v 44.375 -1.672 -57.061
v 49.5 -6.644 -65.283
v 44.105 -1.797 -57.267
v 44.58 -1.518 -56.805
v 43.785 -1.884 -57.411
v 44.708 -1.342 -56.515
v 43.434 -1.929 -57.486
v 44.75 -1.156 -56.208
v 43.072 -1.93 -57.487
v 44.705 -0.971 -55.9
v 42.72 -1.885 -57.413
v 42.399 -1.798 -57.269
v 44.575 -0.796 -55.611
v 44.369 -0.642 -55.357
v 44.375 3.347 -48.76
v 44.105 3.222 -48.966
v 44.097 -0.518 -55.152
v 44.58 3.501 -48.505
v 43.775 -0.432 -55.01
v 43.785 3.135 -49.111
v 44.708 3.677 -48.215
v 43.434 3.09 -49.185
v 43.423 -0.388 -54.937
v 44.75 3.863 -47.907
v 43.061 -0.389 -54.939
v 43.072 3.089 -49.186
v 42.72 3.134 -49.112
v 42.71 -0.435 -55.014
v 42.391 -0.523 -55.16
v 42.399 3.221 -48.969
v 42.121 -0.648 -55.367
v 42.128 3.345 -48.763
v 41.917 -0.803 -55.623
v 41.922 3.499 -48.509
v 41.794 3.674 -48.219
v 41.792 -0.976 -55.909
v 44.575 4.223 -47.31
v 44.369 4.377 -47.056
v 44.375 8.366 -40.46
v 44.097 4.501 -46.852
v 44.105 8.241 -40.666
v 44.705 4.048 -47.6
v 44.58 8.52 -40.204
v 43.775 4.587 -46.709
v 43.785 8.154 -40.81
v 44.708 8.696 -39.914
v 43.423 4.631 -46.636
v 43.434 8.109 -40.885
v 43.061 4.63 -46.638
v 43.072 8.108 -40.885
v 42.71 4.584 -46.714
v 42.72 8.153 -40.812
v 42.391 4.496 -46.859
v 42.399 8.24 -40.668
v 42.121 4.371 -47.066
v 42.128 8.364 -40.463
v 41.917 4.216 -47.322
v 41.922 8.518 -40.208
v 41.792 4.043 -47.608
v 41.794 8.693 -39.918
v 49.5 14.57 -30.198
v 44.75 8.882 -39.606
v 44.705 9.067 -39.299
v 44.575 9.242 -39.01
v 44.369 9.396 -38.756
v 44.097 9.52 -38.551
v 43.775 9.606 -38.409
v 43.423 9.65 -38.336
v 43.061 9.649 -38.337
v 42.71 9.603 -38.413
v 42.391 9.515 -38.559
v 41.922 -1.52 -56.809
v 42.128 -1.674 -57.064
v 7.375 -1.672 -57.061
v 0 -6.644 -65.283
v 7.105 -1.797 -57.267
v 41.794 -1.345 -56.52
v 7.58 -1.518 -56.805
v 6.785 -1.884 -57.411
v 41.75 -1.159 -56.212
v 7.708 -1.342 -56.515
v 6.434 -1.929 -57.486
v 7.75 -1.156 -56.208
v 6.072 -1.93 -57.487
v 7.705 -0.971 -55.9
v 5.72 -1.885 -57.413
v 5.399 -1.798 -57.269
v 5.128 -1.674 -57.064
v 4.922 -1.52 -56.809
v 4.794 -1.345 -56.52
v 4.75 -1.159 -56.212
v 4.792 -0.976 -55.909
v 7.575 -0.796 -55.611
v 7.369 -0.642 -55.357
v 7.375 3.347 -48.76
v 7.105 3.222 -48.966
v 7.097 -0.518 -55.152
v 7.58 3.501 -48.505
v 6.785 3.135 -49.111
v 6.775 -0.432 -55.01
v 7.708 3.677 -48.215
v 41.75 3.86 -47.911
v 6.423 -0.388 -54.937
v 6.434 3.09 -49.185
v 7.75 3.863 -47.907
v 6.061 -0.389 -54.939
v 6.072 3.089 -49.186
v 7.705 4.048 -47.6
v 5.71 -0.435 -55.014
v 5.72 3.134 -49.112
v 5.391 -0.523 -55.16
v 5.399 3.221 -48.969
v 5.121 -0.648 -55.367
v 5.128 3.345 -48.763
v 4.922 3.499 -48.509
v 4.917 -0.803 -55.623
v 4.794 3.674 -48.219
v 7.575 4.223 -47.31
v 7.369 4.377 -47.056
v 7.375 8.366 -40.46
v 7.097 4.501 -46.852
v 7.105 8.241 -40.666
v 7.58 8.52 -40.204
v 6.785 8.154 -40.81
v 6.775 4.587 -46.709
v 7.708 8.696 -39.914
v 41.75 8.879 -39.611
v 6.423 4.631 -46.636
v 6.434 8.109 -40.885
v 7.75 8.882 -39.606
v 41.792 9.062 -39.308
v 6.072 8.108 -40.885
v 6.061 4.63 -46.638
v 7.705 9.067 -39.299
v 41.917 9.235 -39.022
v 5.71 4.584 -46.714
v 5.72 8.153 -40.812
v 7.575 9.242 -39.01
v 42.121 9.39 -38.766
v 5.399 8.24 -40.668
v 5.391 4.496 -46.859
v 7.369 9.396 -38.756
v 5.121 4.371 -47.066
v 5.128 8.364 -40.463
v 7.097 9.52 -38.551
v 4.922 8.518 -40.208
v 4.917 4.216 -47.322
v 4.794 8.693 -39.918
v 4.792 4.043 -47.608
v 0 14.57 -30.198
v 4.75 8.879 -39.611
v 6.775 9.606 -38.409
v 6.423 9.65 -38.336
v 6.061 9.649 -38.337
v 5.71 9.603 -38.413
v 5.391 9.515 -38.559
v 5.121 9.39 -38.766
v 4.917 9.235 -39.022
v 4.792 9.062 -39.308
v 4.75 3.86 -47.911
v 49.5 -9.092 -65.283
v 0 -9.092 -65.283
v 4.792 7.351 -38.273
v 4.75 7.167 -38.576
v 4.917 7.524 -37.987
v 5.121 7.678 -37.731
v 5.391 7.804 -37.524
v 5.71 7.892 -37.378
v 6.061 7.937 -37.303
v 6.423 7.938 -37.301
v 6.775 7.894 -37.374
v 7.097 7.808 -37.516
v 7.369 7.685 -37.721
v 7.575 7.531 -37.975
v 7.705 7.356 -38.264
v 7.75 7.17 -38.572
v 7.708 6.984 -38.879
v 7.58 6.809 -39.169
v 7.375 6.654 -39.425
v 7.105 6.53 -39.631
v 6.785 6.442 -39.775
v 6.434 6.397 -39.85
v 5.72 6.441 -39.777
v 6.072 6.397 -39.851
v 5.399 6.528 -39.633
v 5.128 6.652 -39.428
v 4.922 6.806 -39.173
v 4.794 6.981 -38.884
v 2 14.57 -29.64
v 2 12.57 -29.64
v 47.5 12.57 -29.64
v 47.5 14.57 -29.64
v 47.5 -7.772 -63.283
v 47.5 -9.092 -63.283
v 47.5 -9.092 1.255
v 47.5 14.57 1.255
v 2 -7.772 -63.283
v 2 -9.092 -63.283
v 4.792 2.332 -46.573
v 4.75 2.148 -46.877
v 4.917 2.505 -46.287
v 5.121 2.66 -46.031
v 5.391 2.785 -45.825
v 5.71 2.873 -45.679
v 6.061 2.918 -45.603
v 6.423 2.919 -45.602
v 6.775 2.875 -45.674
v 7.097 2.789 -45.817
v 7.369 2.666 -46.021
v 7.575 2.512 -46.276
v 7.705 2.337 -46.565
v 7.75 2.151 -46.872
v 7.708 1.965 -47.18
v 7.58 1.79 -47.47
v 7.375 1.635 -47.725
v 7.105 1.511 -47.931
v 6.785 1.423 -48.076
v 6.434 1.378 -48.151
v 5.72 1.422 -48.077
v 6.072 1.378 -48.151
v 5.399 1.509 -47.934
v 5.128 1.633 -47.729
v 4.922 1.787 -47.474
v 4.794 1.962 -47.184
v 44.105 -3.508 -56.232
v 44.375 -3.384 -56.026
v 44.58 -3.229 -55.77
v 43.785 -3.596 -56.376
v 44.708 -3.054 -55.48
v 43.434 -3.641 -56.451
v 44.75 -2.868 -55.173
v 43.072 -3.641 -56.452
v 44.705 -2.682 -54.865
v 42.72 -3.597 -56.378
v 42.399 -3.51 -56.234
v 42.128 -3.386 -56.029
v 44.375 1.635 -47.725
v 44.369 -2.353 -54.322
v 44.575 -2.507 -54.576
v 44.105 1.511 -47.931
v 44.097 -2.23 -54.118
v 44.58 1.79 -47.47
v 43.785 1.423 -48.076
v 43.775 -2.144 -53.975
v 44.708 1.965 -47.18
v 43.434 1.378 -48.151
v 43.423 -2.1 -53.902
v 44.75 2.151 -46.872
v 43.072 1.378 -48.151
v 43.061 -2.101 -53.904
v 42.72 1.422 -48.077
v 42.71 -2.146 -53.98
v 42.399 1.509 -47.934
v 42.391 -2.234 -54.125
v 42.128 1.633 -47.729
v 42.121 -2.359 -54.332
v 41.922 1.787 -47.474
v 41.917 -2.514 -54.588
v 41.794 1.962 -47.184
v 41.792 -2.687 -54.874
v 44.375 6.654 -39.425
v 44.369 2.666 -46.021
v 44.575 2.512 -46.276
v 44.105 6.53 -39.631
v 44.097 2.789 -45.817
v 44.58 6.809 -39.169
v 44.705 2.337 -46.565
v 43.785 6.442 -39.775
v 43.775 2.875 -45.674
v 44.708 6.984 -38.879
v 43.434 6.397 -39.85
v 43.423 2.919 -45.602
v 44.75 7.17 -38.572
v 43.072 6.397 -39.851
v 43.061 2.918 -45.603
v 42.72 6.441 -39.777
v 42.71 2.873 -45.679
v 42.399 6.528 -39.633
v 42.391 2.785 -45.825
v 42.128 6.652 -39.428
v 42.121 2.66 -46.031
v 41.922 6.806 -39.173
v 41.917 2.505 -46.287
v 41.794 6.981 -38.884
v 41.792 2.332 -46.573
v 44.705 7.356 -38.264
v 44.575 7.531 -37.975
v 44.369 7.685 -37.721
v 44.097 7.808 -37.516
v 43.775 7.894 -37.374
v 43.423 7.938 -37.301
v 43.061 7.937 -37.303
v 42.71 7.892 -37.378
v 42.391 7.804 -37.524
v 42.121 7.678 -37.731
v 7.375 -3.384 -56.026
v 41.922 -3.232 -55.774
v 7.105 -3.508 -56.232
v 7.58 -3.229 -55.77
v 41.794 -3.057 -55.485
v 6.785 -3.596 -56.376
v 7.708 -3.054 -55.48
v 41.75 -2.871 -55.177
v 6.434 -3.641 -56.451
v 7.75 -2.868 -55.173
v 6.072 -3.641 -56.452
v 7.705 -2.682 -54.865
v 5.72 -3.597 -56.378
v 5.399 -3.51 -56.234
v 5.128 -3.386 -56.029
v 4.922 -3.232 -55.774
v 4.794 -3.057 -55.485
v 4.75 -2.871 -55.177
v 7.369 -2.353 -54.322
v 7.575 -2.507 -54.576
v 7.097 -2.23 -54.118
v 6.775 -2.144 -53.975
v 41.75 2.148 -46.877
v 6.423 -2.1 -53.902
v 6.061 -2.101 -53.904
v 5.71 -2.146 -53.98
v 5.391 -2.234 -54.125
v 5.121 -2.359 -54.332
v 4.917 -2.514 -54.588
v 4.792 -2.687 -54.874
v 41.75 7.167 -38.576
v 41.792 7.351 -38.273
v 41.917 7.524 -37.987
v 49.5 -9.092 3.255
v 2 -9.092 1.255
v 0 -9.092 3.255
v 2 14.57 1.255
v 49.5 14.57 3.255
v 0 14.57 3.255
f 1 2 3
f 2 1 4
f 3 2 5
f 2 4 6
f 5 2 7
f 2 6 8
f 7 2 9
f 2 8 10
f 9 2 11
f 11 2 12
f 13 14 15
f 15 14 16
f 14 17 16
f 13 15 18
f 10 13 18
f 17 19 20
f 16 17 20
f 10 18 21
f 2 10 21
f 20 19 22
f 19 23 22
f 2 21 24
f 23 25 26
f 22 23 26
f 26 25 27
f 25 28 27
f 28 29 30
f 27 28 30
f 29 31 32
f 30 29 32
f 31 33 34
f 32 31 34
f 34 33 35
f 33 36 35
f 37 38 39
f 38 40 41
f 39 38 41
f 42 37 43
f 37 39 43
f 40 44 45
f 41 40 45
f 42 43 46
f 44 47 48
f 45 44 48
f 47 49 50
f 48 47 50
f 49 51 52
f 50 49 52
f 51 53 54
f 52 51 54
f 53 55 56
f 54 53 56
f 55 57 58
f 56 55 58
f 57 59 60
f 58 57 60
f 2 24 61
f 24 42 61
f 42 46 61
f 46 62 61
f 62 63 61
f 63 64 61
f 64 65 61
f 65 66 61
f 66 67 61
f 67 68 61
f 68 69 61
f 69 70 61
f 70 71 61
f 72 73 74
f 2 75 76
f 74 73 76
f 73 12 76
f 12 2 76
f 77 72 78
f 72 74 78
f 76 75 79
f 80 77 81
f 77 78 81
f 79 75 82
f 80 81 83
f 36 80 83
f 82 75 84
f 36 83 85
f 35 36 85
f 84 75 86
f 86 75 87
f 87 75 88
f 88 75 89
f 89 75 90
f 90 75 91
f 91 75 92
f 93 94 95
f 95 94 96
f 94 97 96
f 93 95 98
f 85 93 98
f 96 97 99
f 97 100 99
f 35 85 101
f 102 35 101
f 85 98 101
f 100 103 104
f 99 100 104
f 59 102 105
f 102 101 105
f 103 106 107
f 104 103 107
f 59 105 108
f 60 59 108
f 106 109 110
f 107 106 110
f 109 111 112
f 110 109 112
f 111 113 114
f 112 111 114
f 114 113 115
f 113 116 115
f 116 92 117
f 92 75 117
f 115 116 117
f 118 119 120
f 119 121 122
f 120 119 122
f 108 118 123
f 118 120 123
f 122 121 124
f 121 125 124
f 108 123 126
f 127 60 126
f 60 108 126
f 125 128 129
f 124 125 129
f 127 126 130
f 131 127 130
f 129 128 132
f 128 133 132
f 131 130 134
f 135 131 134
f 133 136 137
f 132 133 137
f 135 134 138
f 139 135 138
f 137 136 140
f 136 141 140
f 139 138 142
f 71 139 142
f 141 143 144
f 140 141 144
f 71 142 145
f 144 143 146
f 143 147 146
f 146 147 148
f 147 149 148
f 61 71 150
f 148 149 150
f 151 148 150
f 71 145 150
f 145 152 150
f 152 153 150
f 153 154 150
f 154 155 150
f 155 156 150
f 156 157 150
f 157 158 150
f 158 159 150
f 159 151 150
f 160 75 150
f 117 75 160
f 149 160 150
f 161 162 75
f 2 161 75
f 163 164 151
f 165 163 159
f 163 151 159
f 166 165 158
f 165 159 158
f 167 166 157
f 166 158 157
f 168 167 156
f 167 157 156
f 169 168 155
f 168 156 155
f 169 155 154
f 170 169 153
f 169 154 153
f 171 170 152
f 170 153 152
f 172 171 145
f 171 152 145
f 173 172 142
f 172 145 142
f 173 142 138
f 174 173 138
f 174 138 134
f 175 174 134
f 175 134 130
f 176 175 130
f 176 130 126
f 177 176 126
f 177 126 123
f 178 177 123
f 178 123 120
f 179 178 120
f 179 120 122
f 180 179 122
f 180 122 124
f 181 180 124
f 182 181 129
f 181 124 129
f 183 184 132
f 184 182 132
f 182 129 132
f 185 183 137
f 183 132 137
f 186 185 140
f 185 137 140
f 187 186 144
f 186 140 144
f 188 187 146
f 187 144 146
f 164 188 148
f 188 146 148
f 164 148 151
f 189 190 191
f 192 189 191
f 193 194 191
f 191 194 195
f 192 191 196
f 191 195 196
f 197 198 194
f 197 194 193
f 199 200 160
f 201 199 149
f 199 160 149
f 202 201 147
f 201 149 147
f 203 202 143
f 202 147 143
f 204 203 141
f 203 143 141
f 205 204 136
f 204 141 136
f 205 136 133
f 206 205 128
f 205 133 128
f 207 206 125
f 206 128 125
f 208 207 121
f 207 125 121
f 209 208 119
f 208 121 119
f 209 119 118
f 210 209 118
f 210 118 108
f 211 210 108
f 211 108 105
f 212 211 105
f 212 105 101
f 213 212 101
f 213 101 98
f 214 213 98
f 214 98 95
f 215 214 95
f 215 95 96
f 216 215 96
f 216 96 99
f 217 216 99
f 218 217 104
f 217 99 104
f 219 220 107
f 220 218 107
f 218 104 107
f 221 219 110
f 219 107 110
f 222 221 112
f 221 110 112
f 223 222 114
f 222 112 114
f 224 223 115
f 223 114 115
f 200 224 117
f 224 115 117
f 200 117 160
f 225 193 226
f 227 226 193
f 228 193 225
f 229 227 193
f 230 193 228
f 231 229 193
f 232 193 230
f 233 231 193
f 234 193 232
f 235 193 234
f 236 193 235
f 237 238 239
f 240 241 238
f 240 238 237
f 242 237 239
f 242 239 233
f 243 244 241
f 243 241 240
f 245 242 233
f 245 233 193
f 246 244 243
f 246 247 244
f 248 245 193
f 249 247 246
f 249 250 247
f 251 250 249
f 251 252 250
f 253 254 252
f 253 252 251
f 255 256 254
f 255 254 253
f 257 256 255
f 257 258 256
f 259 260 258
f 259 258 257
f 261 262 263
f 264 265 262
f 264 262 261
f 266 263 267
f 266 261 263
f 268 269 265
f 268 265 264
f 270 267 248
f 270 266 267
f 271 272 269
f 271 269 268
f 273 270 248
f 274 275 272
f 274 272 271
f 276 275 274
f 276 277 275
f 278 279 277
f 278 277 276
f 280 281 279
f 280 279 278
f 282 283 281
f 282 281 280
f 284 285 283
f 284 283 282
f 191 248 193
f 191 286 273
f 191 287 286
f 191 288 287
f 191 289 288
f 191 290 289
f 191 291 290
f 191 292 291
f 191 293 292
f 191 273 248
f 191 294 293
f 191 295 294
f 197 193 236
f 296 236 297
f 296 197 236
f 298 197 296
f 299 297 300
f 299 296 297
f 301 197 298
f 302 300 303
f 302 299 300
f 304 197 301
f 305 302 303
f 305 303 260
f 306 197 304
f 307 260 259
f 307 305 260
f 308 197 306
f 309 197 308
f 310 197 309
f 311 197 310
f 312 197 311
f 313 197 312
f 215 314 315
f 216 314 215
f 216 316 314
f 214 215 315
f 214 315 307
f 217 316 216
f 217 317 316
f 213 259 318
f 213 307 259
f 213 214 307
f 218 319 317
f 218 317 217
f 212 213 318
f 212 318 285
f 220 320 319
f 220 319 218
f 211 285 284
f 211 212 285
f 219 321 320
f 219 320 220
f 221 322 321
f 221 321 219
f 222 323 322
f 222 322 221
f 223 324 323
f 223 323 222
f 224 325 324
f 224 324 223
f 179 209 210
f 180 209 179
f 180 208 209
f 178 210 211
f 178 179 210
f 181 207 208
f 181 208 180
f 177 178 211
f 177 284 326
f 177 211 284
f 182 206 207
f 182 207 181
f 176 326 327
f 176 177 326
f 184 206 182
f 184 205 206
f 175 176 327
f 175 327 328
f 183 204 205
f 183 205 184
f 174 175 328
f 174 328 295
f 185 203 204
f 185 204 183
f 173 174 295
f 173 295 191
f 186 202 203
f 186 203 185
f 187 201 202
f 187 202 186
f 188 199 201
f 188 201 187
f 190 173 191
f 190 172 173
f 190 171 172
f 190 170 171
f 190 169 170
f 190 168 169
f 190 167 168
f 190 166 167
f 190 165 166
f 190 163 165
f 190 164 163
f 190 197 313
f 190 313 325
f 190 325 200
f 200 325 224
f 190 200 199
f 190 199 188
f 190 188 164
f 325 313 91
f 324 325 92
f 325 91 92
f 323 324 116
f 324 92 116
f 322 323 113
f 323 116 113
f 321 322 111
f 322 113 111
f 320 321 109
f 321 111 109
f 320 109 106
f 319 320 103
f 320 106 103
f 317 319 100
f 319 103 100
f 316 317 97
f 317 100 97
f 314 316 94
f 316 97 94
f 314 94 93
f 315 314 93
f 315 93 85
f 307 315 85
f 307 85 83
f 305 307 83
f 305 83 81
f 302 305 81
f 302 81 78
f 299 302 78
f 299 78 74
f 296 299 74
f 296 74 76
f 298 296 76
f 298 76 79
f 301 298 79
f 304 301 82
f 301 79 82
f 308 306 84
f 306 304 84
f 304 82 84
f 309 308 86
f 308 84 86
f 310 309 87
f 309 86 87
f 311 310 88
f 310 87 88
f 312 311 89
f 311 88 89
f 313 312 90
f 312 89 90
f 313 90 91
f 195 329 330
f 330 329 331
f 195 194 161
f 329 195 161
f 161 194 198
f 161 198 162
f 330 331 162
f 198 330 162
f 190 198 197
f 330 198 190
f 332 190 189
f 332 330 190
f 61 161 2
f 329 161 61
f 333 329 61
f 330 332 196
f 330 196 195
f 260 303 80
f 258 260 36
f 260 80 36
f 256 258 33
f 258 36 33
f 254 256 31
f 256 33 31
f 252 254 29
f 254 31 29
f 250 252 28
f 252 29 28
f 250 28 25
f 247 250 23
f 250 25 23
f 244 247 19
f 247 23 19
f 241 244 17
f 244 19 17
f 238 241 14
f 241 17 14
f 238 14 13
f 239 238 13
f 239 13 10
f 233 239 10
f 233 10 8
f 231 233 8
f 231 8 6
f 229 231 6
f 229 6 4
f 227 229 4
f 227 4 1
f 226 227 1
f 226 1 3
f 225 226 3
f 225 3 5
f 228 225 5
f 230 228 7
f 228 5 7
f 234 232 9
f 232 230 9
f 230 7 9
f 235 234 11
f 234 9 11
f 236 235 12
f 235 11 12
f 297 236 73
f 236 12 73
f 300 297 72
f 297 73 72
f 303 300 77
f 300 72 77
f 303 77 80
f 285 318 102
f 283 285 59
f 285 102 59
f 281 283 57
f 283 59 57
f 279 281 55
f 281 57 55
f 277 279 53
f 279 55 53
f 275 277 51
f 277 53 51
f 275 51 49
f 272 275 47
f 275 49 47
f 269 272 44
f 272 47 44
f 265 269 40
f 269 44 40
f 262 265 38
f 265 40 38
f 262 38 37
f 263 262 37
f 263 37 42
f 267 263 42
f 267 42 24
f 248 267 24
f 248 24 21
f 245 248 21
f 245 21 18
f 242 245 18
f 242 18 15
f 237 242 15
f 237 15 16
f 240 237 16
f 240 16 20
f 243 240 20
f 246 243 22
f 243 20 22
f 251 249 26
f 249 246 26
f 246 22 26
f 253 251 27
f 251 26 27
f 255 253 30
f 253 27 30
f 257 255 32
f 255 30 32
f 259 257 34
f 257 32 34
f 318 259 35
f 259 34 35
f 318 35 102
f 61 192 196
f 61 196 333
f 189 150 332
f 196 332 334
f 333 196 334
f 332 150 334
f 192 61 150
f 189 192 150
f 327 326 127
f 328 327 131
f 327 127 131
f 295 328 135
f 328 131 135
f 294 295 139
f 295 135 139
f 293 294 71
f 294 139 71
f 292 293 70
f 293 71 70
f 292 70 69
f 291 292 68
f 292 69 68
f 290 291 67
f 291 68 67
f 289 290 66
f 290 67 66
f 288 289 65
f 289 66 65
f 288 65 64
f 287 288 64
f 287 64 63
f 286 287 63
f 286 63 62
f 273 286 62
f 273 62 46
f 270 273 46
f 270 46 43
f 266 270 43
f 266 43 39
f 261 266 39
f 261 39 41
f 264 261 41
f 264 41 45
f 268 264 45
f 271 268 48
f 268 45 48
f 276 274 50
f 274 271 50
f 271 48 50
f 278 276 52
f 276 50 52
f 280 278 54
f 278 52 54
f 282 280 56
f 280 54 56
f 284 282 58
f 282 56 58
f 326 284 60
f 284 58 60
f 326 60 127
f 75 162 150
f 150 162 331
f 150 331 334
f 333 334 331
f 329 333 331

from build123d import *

# Parameters (mm, degrees)
F1_DEPTH = 49.5
F2_T     = -2
F3_W     = 45.5
F3_H     = 30.895506
F4_DEPTH = 25
F5_R     = 1.5
F6_DEPTH = 25


with BuildPart() as f1:
    # F0 (on Right) → F1 (new body)
    with BuildSketch(Plane.YZ):
        Polygon((14.57045, 3.255325), (-9.091535, 3.255325), (-9.091535, -65.282837), (-6.643743, -65.282837), (14.57045, -30.197826), align=None)
    extrude(amount=F1_DEPTH)

    # F2
    f2_openings = [f1.faces().sort_by_distance(p)[0] for p in [
        (24.75, -9.091535, -31.013756),
    ]]
    offset(amount=F2_T, openings=f2_openings)

    # F3 (on face) → F4 (cut)
    with BuildSketch(Plane.XZ.offset(-12.57045)):
        with Locations((24.75, -14.192428)):
            Rectangle(F3_W, F3_H)
    extrude(amount=-F4_DEPTH, mode=Mode.SUBTRACT)

    # F5 (on face) → F6 (cut)
    with BuildSketch(Plane(origin=(0, 24.040368, -14.536037), x_dir=(-1, 0, 0), z_dir=(0, 0.855732, -0.517419))):
        with Locations((-43.25, -29.302213)):
            Circle(F5_R)
        with Locations((-43.25, -39.002213)):
            Circle(F5_R)
        with Locations((-43.25, -48.702213)):
            Circle(F5_R)
        with Locations((-6.25, -29.302213)):
            Circle(F5_R)
        with Locations((-6.25, -39.002213)):
            Circle(F5_R)
        with Locations((-6.25, -48.702213)):
            Circle(F5_R)
    extrude(amount=-F6_DEPTH, mode=Mode.SUBTRACT)


solid = f1.part
